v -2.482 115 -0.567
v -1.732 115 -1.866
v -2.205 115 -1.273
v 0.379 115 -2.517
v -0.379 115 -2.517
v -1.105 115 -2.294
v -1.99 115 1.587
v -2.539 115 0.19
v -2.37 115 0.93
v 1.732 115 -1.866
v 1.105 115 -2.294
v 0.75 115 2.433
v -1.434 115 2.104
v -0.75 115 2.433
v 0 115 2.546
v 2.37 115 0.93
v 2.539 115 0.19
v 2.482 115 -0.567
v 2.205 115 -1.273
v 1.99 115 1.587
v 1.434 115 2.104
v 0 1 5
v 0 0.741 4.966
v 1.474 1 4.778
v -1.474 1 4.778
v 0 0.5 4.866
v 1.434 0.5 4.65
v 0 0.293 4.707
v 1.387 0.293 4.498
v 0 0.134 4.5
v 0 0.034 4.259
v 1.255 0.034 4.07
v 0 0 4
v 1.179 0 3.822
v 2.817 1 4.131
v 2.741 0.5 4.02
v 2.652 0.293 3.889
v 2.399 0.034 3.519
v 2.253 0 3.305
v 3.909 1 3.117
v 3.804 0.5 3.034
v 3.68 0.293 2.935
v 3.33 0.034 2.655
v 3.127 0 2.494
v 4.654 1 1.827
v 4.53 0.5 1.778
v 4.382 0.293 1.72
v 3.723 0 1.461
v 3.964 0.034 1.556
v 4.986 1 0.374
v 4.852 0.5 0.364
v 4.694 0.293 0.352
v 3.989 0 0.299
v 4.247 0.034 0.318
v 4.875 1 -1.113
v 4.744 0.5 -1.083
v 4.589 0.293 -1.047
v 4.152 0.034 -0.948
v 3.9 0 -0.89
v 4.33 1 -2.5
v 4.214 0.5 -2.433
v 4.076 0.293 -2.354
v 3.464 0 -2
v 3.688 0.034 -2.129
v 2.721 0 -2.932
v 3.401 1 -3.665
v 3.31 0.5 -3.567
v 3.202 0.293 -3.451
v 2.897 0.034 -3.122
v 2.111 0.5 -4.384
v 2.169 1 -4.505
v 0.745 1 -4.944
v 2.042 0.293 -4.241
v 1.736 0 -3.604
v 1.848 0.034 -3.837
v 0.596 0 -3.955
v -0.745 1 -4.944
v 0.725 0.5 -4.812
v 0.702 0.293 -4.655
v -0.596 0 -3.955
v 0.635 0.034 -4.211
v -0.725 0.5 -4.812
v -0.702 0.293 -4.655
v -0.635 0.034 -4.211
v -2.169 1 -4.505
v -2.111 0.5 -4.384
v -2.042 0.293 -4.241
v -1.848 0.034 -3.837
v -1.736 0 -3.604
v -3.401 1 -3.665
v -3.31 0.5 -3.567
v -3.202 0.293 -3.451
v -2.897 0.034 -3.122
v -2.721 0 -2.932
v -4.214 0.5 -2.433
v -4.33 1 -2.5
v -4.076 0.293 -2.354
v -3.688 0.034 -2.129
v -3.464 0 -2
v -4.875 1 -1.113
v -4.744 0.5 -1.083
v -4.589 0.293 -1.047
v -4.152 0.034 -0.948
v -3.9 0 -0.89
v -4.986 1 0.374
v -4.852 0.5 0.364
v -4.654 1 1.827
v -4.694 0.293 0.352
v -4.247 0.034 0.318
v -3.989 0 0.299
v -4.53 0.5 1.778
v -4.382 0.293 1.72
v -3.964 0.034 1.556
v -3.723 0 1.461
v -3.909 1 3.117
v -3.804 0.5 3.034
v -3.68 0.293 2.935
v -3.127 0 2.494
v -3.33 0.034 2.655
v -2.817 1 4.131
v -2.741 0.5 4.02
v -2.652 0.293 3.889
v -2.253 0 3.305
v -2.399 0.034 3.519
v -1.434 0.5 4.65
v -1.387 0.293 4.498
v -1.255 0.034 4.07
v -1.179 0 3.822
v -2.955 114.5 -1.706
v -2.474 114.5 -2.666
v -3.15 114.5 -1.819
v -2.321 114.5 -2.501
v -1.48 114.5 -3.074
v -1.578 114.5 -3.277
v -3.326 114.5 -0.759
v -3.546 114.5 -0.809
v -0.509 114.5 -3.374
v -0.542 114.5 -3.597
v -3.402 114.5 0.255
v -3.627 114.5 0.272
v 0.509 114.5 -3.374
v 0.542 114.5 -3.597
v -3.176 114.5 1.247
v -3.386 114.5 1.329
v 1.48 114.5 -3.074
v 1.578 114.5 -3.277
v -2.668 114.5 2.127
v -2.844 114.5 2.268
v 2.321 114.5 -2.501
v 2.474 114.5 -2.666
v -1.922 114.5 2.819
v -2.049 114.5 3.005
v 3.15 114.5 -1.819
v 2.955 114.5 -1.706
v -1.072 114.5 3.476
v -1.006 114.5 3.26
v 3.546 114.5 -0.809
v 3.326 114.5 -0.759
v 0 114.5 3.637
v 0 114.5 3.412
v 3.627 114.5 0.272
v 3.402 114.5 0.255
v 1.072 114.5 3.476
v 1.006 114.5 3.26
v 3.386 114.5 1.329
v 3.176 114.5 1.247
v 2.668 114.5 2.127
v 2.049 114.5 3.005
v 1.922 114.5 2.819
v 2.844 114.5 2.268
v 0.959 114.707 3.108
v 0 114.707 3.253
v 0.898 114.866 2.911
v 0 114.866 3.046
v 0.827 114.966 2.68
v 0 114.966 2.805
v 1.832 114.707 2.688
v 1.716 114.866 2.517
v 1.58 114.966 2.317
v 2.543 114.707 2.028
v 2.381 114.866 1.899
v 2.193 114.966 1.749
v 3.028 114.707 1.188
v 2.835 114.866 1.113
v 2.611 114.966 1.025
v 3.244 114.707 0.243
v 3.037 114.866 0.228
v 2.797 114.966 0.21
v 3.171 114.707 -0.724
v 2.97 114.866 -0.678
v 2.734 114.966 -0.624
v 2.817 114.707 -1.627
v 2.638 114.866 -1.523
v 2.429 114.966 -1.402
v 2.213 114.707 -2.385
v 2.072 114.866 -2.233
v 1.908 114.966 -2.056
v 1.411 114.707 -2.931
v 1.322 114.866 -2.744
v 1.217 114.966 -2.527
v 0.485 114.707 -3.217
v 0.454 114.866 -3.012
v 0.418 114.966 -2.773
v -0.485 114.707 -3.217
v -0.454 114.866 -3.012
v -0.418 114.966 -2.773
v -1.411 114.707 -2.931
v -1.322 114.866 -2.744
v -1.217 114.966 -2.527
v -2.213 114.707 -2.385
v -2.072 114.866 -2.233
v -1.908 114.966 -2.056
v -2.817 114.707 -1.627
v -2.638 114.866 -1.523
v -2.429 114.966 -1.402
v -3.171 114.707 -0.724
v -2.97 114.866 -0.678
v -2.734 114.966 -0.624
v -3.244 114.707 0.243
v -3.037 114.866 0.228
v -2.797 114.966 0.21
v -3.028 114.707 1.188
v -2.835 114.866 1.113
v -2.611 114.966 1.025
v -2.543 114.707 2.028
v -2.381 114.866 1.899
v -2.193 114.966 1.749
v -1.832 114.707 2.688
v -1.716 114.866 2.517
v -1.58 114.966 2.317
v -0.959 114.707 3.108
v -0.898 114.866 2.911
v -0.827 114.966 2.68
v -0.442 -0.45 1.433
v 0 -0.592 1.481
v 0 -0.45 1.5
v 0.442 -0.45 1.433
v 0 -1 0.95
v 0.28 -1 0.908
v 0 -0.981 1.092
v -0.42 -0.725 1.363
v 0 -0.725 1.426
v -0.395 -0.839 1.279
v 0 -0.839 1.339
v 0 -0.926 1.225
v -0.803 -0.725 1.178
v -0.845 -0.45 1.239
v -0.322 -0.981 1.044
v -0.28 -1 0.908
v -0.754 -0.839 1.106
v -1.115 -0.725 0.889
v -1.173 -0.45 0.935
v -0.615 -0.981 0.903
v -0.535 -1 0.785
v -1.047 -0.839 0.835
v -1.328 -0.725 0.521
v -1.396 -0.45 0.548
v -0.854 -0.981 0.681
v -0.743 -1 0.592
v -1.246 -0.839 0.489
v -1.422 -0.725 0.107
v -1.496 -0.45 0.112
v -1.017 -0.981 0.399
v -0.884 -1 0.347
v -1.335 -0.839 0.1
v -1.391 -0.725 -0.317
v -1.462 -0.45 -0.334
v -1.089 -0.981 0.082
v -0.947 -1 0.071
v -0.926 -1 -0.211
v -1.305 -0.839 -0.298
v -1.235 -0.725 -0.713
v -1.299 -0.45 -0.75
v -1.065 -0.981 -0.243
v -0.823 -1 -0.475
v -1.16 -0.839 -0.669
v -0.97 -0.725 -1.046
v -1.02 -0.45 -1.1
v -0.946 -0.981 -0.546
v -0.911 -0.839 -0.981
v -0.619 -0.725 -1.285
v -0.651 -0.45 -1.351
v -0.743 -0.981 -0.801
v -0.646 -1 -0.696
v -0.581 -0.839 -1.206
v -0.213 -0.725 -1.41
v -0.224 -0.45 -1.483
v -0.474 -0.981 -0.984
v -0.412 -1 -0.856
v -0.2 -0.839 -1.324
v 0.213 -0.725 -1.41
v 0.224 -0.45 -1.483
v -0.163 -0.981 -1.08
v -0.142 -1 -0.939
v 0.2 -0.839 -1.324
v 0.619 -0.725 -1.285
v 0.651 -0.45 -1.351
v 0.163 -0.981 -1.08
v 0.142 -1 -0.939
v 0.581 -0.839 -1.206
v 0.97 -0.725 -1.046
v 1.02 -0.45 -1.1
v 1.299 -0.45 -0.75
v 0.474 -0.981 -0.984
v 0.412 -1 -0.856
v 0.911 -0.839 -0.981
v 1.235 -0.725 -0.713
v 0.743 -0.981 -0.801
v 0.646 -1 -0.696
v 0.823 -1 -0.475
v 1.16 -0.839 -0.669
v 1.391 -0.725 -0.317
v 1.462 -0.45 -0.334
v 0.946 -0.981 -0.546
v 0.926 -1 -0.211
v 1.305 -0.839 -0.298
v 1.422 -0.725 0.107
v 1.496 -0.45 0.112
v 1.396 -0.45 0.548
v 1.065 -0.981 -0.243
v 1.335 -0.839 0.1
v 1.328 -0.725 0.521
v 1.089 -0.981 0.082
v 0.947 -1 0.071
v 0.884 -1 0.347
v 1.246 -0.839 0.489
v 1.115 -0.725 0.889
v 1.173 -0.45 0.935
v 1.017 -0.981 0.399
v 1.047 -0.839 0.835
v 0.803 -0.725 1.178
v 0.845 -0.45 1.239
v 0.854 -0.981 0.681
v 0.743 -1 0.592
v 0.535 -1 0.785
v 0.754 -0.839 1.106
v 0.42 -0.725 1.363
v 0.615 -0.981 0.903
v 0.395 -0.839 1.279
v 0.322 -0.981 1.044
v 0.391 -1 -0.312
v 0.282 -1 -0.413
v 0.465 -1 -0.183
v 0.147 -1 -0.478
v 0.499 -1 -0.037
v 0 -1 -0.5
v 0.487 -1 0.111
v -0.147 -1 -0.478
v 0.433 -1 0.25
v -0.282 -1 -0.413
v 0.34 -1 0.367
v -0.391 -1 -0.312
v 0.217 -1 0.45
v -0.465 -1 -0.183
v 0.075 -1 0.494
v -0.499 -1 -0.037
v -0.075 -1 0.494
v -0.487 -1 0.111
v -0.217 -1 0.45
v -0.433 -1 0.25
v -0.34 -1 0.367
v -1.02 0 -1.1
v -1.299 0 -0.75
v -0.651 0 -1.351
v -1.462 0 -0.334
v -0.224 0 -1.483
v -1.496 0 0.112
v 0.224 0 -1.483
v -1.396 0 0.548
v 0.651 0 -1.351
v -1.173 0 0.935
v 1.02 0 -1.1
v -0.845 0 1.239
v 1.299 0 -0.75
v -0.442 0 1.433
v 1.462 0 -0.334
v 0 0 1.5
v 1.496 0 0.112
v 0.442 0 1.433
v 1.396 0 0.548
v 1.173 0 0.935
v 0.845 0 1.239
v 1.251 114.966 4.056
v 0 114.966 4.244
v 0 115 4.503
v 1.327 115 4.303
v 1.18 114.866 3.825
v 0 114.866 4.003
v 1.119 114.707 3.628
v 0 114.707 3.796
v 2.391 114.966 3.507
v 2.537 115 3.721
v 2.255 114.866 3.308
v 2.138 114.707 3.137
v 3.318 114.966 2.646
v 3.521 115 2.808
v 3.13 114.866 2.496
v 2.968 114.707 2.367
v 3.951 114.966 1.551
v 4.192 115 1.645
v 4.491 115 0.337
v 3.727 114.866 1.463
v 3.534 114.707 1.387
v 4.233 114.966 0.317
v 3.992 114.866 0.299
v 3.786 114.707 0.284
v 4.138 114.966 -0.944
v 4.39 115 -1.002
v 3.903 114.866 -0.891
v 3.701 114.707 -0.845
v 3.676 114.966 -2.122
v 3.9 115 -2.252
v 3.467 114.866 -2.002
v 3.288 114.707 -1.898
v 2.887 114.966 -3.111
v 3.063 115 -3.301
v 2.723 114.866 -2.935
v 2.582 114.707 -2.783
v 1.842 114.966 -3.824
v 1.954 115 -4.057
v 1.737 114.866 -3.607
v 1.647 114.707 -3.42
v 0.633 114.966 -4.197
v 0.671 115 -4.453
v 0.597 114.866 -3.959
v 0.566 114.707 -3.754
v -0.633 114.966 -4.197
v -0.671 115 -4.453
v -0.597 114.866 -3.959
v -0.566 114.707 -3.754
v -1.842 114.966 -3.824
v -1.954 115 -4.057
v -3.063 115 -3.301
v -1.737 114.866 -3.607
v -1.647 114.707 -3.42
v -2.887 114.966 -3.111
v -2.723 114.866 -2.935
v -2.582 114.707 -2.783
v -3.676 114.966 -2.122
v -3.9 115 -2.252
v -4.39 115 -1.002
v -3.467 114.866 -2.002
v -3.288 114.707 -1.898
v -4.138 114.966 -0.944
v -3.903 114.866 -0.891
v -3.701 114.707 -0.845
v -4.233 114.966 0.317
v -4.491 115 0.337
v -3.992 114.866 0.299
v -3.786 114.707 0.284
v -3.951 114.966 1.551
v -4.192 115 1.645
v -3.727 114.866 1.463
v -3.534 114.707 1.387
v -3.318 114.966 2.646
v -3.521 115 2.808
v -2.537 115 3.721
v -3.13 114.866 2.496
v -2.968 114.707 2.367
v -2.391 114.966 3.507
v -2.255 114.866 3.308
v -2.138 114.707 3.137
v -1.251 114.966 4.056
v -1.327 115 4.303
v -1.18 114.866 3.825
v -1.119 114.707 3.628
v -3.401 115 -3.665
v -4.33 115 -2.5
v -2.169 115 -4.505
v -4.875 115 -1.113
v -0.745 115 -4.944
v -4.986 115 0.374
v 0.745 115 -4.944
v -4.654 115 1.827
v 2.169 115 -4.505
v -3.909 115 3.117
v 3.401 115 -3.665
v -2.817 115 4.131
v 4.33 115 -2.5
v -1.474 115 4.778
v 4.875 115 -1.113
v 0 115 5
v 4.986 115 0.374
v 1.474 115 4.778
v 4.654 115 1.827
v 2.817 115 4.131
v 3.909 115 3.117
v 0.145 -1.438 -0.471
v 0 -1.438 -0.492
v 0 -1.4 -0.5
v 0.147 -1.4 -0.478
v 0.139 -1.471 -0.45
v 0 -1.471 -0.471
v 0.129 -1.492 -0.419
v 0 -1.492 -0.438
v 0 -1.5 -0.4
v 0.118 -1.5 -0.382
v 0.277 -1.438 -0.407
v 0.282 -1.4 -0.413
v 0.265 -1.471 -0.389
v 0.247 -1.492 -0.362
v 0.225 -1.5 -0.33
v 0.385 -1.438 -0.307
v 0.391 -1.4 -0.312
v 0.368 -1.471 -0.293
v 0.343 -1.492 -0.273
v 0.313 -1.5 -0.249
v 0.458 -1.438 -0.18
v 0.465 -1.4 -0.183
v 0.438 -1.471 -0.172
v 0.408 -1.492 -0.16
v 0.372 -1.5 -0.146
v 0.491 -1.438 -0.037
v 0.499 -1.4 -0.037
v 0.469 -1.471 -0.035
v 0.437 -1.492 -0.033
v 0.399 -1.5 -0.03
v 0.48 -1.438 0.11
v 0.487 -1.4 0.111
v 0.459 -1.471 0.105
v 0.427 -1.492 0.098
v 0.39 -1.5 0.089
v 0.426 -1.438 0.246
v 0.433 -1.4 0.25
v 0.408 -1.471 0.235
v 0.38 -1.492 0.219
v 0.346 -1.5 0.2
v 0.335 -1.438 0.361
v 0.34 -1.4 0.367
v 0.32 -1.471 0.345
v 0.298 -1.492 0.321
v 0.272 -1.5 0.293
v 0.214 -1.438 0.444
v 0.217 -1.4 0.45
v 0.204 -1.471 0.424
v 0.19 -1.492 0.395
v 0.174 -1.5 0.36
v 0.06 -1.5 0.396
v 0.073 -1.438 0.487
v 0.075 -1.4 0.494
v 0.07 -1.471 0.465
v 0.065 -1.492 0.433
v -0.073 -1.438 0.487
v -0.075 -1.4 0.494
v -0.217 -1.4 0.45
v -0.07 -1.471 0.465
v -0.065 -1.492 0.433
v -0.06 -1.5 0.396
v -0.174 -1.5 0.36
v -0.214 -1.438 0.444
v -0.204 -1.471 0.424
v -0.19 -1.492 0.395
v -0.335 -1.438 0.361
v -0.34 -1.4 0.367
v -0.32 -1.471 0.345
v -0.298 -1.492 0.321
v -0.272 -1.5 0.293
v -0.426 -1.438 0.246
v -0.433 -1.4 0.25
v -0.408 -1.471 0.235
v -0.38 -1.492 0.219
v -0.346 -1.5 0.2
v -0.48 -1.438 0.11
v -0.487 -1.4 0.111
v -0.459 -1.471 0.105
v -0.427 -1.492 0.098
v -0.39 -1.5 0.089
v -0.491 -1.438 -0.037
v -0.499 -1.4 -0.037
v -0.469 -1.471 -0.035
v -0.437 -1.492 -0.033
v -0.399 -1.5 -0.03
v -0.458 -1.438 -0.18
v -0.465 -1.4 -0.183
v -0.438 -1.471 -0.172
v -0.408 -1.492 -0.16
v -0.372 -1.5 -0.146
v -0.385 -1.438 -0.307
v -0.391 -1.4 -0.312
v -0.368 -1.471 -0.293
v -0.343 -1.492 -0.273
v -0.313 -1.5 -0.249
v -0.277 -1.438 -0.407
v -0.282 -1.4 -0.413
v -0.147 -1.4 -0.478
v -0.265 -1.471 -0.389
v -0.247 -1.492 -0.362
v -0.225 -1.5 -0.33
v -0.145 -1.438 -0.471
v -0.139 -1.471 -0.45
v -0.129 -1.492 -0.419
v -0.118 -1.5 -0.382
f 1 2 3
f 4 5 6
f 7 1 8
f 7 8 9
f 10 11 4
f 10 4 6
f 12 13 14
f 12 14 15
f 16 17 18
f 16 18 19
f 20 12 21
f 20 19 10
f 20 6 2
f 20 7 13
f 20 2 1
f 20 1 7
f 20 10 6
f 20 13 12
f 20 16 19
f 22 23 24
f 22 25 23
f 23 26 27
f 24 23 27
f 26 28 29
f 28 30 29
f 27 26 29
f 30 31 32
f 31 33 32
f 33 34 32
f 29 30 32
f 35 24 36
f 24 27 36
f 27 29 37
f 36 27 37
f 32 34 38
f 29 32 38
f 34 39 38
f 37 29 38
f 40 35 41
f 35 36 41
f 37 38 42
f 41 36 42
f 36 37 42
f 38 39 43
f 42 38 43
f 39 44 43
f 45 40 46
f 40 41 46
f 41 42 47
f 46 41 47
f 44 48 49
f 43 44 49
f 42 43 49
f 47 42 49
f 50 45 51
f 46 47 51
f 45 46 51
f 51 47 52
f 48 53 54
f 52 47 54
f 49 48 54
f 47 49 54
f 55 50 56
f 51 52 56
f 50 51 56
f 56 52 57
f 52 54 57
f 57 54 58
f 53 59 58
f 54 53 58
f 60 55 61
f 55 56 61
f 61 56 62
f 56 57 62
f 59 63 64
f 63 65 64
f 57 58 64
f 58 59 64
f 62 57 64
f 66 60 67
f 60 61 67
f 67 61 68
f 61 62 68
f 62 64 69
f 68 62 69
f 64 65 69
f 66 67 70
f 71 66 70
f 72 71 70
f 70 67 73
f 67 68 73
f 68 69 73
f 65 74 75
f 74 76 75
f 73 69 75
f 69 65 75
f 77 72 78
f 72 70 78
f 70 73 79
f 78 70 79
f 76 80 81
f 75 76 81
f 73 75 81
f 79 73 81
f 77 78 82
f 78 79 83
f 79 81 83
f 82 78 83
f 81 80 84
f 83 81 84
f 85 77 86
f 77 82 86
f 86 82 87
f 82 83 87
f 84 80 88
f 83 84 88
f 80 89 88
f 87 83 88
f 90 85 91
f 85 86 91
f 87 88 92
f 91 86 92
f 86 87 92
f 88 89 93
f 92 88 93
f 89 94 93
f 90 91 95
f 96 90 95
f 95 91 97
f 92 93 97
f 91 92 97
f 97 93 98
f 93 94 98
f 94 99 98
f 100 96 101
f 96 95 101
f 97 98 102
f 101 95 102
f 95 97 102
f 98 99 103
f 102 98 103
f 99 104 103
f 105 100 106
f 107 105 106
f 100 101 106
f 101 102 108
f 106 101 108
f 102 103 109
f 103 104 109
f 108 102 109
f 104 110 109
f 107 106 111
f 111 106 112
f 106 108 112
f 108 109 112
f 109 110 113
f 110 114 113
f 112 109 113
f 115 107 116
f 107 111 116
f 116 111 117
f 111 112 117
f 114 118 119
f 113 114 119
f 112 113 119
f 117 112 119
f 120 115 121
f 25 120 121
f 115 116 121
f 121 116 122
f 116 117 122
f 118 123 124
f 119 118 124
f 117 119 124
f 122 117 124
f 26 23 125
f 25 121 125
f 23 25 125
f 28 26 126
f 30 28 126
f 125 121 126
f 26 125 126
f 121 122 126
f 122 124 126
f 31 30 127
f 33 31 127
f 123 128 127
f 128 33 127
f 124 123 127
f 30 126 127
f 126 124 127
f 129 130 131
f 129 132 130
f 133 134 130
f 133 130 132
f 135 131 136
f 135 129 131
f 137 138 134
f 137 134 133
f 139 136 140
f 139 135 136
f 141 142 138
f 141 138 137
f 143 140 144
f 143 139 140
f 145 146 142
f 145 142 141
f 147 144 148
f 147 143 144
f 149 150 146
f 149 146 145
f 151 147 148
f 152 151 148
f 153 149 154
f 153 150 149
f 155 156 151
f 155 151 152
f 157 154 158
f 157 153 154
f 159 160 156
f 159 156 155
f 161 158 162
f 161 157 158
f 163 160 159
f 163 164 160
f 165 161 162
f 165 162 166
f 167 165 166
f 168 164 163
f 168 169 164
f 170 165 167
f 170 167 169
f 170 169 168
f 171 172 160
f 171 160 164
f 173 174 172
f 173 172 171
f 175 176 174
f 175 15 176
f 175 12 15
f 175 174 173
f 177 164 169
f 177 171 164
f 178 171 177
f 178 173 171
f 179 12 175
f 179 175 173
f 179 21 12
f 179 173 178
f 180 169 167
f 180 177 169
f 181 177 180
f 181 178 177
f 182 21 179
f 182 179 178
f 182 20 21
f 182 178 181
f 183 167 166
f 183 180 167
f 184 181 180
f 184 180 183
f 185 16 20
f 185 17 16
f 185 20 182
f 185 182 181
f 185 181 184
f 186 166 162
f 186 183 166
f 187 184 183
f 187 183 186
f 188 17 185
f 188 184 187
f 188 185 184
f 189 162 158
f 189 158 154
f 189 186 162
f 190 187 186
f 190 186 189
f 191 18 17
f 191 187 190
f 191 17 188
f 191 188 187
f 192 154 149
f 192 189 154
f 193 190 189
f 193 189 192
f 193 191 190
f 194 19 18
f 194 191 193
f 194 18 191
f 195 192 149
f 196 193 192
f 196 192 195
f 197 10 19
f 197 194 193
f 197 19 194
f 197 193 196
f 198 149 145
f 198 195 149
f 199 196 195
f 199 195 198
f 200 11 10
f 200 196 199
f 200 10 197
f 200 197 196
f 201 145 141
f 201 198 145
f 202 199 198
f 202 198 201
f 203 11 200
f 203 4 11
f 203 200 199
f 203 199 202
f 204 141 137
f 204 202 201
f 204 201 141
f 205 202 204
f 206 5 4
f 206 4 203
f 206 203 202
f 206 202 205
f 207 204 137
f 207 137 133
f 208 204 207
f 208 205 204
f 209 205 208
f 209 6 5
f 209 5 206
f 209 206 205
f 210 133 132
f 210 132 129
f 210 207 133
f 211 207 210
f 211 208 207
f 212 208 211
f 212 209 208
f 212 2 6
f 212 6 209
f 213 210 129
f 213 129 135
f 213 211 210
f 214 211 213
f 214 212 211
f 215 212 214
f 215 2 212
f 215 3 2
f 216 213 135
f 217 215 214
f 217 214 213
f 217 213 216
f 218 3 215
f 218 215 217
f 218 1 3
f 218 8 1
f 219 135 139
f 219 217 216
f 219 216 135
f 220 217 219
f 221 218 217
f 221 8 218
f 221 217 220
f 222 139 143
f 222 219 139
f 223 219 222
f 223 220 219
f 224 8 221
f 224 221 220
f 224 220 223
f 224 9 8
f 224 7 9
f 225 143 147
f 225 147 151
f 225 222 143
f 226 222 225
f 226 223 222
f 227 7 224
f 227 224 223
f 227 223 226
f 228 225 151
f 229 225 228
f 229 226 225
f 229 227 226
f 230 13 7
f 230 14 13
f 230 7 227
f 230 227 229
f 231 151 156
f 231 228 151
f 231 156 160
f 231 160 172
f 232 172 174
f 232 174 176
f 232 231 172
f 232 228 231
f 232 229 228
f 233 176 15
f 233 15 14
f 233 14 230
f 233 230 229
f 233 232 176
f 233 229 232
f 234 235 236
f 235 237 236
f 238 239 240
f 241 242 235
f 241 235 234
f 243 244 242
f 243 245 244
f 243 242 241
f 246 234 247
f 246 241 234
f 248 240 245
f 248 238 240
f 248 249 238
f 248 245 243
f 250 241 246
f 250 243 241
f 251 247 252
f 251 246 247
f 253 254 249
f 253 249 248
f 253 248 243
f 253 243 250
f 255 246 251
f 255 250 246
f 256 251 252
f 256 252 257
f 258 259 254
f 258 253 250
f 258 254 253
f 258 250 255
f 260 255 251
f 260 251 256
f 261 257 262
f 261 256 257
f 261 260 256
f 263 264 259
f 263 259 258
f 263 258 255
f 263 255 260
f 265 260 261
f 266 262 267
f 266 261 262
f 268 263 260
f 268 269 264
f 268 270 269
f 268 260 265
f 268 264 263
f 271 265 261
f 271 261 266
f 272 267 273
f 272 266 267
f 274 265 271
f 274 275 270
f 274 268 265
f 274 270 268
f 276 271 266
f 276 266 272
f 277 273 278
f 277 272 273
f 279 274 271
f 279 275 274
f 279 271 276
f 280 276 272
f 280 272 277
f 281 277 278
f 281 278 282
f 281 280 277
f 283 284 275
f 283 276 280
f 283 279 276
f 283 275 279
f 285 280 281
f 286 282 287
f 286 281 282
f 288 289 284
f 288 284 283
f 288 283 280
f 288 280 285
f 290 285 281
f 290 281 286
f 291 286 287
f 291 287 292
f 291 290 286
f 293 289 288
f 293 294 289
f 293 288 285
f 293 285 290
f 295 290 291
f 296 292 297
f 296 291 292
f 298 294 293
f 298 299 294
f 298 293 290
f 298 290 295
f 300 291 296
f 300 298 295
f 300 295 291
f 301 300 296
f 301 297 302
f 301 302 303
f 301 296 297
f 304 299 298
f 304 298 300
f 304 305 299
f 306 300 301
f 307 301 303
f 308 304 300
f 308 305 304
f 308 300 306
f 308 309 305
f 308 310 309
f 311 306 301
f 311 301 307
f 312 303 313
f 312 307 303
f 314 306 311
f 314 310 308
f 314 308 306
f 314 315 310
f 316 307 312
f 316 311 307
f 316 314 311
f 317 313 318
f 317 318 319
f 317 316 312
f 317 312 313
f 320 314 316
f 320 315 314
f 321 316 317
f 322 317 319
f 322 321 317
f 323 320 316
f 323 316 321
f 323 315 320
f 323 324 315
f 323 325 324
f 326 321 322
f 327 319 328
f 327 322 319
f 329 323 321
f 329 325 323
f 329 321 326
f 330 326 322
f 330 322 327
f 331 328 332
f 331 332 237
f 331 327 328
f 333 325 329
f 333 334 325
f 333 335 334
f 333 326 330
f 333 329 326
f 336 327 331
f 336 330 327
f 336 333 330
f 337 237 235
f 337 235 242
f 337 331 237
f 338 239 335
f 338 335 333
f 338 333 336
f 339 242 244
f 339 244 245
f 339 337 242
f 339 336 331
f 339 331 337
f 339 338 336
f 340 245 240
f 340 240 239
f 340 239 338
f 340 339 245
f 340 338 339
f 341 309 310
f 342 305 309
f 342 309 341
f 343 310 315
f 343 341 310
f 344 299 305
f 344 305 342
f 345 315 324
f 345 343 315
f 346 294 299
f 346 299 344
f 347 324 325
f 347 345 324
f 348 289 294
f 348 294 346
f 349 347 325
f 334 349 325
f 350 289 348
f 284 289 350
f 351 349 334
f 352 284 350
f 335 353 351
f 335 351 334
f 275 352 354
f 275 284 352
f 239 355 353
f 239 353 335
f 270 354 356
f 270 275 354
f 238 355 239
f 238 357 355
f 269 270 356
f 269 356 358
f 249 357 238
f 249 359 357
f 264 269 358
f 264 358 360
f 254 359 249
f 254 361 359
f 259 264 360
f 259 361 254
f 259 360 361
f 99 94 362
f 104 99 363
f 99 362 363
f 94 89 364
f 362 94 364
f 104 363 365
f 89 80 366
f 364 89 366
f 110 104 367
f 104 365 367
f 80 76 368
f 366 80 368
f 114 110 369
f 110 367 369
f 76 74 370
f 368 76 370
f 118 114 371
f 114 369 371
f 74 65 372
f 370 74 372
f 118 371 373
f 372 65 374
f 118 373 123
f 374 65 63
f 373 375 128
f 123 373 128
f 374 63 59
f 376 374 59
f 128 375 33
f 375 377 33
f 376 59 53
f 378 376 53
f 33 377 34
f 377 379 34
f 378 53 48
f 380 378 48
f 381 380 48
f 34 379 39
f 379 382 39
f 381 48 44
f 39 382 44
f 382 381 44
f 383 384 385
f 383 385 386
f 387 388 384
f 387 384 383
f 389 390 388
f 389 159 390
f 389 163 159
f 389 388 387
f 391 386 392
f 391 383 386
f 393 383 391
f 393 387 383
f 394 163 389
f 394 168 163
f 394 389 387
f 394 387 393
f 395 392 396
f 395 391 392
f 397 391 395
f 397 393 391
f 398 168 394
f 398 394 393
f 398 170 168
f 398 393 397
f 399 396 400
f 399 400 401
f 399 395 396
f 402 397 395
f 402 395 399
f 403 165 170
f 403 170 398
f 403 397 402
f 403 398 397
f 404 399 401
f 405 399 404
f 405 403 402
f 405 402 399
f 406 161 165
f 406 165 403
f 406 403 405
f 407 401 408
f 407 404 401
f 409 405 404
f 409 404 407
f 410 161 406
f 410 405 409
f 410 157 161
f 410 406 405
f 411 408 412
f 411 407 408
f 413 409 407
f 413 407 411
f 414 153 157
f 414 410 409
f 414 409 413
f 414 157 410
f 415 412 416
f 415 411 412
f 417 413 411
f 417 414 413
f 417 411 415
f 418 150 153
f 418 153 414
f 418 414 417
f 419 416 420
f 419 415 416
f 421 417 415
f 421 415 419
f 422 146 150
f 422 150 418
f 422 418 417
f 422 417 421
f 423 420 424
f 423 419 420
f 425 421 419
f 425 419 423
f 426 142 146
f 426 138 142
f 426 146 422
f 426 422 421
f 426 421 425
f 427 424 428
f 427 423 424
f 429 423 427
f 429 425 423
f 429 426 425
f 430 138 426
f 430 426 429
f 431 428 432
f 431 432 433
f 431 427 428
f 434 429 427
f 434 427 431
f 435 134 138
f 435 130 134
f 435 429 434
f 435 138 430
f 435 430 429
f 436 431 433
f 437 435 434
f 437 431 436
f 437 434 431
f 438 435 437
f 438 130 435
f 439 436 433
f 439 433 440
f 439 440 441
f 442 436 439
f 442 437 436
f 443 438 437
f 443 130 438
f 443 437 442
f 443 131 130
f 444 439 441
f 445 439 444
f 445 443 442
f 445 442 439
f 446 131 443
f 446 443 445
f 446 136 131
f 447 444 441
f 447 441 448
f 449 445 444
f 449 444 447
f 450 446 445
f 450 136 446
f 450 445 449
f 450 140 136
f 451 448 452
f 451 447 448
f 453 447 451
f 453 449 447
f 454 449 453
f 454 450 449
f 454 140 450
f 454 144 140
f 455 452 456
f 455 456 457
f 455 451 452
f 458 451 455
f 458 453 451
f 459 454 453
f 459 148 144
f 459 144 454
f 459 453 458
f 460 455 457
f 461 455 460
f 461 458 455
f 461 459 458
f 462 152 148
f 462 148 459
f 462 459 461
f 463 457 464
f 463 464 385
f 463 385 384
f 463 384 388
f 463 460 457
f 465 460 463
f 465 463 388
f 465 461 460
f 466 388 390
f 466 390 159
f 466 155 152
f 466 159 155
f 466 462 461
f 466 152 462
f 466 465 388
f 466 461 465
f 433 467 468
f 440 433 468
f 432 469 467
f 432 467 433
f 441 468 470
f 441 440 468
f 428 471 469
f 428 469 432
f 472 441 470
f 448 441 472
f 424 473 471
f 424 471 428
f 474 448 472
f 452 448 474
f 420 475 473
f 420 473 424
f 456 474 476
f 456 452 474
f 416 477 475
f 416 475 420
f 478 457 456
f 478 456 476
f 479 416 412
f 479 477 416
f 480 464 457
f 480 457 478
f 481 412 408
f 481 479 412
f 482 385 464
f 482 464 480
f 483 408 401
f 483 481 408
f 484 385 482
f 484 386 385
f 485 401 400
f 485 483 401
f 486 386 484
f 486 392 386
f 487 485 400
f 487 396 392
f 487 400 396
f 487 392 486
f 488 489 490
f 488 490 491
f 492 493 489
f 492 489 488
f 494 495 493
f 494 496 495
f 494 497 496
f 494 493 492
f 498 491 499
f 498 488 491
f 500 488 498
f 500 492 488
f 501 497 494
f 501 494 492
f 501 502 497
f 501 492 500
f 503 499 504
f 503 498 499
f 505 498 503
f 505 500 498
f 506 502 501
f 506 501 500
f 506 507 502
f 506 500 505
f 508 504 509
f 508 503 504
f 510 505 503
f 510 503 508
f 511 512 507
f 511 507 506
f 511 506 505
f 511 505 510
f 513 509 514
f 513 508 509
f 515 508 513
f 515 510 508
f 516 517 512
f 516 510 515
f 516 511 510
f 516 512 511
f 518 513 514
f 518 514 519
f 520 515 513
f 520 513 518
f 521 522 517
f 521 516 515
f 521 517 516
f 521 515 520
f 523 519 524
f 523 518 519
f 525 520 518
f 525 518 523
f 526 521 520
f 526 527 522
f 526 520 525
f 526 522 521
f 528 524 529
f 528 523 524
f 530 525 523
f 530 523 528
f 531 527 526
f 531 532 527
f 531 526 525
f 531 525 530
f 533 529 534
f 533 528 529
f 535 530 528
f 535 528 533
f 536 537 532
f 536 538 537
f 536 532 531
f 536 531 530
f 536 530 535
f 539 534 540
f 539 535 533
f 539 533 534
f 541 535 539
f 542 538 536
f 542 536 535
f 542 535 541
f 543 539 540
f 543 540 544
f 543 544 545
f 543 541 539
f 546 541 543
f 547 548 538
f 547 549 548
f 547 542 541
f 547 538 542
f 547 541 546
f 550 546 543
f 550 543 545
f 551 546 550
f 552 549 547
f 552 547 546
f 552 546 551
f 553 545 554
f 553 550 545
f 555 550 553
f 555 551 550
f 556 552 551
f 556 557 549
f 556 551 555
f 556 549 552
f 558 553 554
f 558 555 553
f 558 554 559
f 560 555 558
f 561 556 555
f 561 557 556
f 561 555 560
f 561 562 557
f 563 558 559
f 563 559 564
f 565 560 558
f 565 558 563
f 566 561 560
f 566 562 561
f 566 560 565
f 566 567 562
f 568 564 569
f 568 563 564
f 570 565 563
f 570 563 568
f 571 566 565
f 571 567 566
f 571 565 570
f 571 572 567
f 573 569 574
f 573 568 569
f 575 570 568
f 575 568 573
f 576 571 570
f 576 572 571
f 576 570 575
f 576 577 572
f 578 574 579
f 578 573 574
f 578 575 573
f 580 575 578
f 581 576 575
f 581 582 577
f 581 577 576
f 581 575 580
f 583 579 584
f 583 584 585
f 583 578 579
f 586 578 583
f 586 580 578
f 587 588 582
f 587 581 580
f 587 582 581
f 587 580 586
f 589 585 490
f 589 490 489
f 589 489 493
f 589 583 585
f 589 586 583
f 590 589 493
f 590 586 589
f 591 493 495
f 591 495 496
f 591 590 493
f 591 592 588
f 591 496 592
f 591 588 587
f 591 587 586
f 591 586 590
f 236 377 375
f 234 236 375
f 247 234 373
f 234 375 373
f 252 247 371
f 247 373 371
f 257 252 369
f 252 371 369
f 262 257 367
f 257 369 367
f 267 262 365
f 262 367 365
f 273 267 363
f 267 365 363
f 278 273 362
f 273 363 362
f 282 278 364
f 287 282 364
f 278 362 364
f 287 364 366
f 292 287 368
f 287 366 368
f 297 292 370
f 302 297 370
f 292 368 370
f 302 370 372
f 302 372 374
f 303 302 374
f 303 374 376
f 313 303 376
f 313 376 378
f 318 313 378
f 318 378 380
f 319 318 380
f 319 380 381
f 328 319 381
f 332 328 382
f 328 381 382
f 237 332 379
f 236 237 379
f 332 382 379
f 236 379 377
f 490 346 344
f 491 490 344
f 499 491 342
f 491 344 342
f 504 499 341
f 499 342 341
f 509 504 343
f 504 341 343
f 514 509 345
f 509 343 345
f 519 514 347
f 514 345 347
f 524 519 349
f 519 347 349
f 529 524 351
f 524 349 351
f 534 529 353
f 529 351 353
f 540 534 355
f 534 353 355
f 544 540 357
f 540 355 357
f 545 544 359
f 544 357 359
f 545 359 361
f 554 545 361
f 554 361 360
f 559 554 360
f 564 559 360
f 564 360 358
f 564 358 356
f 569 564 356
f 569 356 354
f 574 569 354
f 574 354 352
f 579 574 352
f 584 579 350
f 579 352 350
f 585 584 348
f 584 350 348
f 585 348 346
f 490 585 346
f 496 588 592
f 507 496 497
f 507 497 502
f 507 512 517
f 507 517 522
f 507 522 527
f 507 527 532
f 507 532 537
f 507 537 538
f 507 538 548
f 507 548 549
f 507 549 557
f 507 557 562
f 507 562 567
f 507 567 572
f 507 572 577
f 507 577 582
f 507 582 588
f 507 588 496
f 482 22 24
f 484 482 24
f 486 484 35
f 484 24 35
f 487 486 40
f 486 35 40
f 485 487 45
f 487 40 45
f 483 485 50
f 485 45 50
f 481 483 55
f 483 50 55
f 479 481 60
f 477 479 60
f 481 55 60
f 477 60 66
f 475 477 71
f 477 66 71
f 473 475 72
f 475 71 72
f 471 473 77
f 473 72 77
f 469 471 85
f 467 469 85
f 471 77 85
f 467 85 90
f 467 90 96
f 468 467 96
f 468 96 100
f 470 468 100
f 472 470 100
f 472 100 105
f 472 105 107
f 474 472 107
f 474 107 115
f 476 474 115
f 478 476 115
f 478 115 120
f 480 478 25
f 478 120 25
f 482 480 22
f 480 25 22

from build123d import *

# Parameters (mm, degrees)
SKETCH1_R           = 5
BOSS_EXTRUDE1_DEPTH = 115
SKETCH2_R           = 1.5
BOSS_EXTRUDE2_DEPTH = 1
SKETCH3_R           = 0.5
BOSS_EXTRUDE3_DEPTH = 0.5
SKETCH4_R           = 3.63725935
SKETCH4_R_2         = 3.411929034
CUT_EXTRUDE1_DEPTH  = 0.5
FILLET1_R           = 1
FILLET2_R           = 1
FILLET6_R           = 0.55
FILLET7_R           = 0.1


with BuildPart() as part:
    # Sketch1 → Boss-Extrude1 (new body)
    with BuildSketch(Plane(origin=(0, 0, 0), x_dir=(1, 0, 0), z_dir=(0, 1, 0))):
        with Locations(Location((0, 0, 0), (0, 0, 270))):
            Circle(SKETCH1_R)
    extrude(amount=BOSS_EXTRUDE1_DEPTH)

    # Sketch2 → Boss-Extrude2 (add)
    with BuildSketch(Plane.XZ):
        with Locations(Location((0, 0, 0), (0, 0, 90))):
            Circle(SKETCH2_R)
    extrude(amount=BOSS_EXTRUDE2_DEPTH)

    # Sketch3 → Boss-Extrude3 (add)
    with BuildSketch(Plane.XZ.offset(1)):
        with Locations(Location((0, 0, 0), (0, 0, 270))):
            Circle(SKETCH3_R)
    extrude(amount=BOSS_EXTRUDE3_DEPTH)

    # Sketch4 → Cut-Extrude1 (cut)
    with BuildSketch(Plane(origin=(0, 115, 0), x_dir=(1, 0, 0), z_dir=(0, 1, 0))):
        with Locations(Location((0, 0, 0), (0, 0, 270))):
            Circle(SKETCH4_R)
        with Locations(Location((0, 0, 0), (0, 0, 270))):
            Circle(SKETCH4_R_2, mode=Mode.SUBTRACT)
    extrude(amount=-CUT_EXTRUDE1_DEPTH, mode=Mode.SUBTRACT)

    # Fillet1
    # the kernel refuses this fillet: 1 mm, written as the material it takes off along each edge
    with BuildSketch(Plane(origin=(0, 115, 0), x_dir=(0, 0, 1), z_dir=(-1, 0, 0))) as fillet1_piece_1:
        with BuildLine():
            CenterArc((4.503284754, -1), FILLET1_R, 90, 60)
            Line((3.63725935, -0.5), (3.619938842, -0.49))
            ThreePointArc((3.619938842, -0.49), (3.61725935, -0.25), (3.61725935, 0))
            Line((3.61725935, 0), (3.63725935, 0.02))
            Line((3.63725935, 0.02), (4.503284754, 0.02))
            Line((4.503284754, 0.02), (4.503284754, 0))
        make_face()
    revolve(axis=Axis((0, 115, 0), (0, 1, 0)), mode=Mode.SUBTRACT)
    with BuildSketch(Plane(origin=(0, 115, 0), x_dir=(0, 0, 1), z_dir=(-1, 0, 0))) as fillet1_piece_2:
        with BuildLine():
            CenterArc((2.545903631, -1), FILLET1_R, 30, 60)
            Line((2.545903631, 0), (2.545903631, 0.02))
            Line((2.545903631, 0.02), (3.411929034, 0.02))
            Line((3.411929034, 0.02), (3.431929034, 0))
            ThreePointArc((3.431929034, 0), (3.431929034, -0.25), (3.429249543, -0.49))
            Line((3.429249543, -0.49), (3.411929034, -0.5))
        make_face()
    revolve(axis=Axis((0, 115, 0), (0, 1, 0)), mode=Mode.SUBTRACT)

    # Fillet2
    fillet2_edges = [part.edges().sort_by_distance(p)[0] for p in [
        (0, 0, -5),
    ]]
    fillet(fillet2_edges, radius=FILLET2_R)

    # Fillet6
    fillet6_edges = [part.edges().sort_by_distance(p)[0] for p in [
        (0, -1, -1.5),
    ]]
    fillet(fillet6_edges, radius=FILLET6_R)

    # Fillet7
    fillet7_edges = [part.edges().sort_by_distance(p)[0] for p in [
        (0, -1.5, 0.5),
    ]]
    fillet(fillet7_edges, radius=FILLET7_R)


solid = part.part
